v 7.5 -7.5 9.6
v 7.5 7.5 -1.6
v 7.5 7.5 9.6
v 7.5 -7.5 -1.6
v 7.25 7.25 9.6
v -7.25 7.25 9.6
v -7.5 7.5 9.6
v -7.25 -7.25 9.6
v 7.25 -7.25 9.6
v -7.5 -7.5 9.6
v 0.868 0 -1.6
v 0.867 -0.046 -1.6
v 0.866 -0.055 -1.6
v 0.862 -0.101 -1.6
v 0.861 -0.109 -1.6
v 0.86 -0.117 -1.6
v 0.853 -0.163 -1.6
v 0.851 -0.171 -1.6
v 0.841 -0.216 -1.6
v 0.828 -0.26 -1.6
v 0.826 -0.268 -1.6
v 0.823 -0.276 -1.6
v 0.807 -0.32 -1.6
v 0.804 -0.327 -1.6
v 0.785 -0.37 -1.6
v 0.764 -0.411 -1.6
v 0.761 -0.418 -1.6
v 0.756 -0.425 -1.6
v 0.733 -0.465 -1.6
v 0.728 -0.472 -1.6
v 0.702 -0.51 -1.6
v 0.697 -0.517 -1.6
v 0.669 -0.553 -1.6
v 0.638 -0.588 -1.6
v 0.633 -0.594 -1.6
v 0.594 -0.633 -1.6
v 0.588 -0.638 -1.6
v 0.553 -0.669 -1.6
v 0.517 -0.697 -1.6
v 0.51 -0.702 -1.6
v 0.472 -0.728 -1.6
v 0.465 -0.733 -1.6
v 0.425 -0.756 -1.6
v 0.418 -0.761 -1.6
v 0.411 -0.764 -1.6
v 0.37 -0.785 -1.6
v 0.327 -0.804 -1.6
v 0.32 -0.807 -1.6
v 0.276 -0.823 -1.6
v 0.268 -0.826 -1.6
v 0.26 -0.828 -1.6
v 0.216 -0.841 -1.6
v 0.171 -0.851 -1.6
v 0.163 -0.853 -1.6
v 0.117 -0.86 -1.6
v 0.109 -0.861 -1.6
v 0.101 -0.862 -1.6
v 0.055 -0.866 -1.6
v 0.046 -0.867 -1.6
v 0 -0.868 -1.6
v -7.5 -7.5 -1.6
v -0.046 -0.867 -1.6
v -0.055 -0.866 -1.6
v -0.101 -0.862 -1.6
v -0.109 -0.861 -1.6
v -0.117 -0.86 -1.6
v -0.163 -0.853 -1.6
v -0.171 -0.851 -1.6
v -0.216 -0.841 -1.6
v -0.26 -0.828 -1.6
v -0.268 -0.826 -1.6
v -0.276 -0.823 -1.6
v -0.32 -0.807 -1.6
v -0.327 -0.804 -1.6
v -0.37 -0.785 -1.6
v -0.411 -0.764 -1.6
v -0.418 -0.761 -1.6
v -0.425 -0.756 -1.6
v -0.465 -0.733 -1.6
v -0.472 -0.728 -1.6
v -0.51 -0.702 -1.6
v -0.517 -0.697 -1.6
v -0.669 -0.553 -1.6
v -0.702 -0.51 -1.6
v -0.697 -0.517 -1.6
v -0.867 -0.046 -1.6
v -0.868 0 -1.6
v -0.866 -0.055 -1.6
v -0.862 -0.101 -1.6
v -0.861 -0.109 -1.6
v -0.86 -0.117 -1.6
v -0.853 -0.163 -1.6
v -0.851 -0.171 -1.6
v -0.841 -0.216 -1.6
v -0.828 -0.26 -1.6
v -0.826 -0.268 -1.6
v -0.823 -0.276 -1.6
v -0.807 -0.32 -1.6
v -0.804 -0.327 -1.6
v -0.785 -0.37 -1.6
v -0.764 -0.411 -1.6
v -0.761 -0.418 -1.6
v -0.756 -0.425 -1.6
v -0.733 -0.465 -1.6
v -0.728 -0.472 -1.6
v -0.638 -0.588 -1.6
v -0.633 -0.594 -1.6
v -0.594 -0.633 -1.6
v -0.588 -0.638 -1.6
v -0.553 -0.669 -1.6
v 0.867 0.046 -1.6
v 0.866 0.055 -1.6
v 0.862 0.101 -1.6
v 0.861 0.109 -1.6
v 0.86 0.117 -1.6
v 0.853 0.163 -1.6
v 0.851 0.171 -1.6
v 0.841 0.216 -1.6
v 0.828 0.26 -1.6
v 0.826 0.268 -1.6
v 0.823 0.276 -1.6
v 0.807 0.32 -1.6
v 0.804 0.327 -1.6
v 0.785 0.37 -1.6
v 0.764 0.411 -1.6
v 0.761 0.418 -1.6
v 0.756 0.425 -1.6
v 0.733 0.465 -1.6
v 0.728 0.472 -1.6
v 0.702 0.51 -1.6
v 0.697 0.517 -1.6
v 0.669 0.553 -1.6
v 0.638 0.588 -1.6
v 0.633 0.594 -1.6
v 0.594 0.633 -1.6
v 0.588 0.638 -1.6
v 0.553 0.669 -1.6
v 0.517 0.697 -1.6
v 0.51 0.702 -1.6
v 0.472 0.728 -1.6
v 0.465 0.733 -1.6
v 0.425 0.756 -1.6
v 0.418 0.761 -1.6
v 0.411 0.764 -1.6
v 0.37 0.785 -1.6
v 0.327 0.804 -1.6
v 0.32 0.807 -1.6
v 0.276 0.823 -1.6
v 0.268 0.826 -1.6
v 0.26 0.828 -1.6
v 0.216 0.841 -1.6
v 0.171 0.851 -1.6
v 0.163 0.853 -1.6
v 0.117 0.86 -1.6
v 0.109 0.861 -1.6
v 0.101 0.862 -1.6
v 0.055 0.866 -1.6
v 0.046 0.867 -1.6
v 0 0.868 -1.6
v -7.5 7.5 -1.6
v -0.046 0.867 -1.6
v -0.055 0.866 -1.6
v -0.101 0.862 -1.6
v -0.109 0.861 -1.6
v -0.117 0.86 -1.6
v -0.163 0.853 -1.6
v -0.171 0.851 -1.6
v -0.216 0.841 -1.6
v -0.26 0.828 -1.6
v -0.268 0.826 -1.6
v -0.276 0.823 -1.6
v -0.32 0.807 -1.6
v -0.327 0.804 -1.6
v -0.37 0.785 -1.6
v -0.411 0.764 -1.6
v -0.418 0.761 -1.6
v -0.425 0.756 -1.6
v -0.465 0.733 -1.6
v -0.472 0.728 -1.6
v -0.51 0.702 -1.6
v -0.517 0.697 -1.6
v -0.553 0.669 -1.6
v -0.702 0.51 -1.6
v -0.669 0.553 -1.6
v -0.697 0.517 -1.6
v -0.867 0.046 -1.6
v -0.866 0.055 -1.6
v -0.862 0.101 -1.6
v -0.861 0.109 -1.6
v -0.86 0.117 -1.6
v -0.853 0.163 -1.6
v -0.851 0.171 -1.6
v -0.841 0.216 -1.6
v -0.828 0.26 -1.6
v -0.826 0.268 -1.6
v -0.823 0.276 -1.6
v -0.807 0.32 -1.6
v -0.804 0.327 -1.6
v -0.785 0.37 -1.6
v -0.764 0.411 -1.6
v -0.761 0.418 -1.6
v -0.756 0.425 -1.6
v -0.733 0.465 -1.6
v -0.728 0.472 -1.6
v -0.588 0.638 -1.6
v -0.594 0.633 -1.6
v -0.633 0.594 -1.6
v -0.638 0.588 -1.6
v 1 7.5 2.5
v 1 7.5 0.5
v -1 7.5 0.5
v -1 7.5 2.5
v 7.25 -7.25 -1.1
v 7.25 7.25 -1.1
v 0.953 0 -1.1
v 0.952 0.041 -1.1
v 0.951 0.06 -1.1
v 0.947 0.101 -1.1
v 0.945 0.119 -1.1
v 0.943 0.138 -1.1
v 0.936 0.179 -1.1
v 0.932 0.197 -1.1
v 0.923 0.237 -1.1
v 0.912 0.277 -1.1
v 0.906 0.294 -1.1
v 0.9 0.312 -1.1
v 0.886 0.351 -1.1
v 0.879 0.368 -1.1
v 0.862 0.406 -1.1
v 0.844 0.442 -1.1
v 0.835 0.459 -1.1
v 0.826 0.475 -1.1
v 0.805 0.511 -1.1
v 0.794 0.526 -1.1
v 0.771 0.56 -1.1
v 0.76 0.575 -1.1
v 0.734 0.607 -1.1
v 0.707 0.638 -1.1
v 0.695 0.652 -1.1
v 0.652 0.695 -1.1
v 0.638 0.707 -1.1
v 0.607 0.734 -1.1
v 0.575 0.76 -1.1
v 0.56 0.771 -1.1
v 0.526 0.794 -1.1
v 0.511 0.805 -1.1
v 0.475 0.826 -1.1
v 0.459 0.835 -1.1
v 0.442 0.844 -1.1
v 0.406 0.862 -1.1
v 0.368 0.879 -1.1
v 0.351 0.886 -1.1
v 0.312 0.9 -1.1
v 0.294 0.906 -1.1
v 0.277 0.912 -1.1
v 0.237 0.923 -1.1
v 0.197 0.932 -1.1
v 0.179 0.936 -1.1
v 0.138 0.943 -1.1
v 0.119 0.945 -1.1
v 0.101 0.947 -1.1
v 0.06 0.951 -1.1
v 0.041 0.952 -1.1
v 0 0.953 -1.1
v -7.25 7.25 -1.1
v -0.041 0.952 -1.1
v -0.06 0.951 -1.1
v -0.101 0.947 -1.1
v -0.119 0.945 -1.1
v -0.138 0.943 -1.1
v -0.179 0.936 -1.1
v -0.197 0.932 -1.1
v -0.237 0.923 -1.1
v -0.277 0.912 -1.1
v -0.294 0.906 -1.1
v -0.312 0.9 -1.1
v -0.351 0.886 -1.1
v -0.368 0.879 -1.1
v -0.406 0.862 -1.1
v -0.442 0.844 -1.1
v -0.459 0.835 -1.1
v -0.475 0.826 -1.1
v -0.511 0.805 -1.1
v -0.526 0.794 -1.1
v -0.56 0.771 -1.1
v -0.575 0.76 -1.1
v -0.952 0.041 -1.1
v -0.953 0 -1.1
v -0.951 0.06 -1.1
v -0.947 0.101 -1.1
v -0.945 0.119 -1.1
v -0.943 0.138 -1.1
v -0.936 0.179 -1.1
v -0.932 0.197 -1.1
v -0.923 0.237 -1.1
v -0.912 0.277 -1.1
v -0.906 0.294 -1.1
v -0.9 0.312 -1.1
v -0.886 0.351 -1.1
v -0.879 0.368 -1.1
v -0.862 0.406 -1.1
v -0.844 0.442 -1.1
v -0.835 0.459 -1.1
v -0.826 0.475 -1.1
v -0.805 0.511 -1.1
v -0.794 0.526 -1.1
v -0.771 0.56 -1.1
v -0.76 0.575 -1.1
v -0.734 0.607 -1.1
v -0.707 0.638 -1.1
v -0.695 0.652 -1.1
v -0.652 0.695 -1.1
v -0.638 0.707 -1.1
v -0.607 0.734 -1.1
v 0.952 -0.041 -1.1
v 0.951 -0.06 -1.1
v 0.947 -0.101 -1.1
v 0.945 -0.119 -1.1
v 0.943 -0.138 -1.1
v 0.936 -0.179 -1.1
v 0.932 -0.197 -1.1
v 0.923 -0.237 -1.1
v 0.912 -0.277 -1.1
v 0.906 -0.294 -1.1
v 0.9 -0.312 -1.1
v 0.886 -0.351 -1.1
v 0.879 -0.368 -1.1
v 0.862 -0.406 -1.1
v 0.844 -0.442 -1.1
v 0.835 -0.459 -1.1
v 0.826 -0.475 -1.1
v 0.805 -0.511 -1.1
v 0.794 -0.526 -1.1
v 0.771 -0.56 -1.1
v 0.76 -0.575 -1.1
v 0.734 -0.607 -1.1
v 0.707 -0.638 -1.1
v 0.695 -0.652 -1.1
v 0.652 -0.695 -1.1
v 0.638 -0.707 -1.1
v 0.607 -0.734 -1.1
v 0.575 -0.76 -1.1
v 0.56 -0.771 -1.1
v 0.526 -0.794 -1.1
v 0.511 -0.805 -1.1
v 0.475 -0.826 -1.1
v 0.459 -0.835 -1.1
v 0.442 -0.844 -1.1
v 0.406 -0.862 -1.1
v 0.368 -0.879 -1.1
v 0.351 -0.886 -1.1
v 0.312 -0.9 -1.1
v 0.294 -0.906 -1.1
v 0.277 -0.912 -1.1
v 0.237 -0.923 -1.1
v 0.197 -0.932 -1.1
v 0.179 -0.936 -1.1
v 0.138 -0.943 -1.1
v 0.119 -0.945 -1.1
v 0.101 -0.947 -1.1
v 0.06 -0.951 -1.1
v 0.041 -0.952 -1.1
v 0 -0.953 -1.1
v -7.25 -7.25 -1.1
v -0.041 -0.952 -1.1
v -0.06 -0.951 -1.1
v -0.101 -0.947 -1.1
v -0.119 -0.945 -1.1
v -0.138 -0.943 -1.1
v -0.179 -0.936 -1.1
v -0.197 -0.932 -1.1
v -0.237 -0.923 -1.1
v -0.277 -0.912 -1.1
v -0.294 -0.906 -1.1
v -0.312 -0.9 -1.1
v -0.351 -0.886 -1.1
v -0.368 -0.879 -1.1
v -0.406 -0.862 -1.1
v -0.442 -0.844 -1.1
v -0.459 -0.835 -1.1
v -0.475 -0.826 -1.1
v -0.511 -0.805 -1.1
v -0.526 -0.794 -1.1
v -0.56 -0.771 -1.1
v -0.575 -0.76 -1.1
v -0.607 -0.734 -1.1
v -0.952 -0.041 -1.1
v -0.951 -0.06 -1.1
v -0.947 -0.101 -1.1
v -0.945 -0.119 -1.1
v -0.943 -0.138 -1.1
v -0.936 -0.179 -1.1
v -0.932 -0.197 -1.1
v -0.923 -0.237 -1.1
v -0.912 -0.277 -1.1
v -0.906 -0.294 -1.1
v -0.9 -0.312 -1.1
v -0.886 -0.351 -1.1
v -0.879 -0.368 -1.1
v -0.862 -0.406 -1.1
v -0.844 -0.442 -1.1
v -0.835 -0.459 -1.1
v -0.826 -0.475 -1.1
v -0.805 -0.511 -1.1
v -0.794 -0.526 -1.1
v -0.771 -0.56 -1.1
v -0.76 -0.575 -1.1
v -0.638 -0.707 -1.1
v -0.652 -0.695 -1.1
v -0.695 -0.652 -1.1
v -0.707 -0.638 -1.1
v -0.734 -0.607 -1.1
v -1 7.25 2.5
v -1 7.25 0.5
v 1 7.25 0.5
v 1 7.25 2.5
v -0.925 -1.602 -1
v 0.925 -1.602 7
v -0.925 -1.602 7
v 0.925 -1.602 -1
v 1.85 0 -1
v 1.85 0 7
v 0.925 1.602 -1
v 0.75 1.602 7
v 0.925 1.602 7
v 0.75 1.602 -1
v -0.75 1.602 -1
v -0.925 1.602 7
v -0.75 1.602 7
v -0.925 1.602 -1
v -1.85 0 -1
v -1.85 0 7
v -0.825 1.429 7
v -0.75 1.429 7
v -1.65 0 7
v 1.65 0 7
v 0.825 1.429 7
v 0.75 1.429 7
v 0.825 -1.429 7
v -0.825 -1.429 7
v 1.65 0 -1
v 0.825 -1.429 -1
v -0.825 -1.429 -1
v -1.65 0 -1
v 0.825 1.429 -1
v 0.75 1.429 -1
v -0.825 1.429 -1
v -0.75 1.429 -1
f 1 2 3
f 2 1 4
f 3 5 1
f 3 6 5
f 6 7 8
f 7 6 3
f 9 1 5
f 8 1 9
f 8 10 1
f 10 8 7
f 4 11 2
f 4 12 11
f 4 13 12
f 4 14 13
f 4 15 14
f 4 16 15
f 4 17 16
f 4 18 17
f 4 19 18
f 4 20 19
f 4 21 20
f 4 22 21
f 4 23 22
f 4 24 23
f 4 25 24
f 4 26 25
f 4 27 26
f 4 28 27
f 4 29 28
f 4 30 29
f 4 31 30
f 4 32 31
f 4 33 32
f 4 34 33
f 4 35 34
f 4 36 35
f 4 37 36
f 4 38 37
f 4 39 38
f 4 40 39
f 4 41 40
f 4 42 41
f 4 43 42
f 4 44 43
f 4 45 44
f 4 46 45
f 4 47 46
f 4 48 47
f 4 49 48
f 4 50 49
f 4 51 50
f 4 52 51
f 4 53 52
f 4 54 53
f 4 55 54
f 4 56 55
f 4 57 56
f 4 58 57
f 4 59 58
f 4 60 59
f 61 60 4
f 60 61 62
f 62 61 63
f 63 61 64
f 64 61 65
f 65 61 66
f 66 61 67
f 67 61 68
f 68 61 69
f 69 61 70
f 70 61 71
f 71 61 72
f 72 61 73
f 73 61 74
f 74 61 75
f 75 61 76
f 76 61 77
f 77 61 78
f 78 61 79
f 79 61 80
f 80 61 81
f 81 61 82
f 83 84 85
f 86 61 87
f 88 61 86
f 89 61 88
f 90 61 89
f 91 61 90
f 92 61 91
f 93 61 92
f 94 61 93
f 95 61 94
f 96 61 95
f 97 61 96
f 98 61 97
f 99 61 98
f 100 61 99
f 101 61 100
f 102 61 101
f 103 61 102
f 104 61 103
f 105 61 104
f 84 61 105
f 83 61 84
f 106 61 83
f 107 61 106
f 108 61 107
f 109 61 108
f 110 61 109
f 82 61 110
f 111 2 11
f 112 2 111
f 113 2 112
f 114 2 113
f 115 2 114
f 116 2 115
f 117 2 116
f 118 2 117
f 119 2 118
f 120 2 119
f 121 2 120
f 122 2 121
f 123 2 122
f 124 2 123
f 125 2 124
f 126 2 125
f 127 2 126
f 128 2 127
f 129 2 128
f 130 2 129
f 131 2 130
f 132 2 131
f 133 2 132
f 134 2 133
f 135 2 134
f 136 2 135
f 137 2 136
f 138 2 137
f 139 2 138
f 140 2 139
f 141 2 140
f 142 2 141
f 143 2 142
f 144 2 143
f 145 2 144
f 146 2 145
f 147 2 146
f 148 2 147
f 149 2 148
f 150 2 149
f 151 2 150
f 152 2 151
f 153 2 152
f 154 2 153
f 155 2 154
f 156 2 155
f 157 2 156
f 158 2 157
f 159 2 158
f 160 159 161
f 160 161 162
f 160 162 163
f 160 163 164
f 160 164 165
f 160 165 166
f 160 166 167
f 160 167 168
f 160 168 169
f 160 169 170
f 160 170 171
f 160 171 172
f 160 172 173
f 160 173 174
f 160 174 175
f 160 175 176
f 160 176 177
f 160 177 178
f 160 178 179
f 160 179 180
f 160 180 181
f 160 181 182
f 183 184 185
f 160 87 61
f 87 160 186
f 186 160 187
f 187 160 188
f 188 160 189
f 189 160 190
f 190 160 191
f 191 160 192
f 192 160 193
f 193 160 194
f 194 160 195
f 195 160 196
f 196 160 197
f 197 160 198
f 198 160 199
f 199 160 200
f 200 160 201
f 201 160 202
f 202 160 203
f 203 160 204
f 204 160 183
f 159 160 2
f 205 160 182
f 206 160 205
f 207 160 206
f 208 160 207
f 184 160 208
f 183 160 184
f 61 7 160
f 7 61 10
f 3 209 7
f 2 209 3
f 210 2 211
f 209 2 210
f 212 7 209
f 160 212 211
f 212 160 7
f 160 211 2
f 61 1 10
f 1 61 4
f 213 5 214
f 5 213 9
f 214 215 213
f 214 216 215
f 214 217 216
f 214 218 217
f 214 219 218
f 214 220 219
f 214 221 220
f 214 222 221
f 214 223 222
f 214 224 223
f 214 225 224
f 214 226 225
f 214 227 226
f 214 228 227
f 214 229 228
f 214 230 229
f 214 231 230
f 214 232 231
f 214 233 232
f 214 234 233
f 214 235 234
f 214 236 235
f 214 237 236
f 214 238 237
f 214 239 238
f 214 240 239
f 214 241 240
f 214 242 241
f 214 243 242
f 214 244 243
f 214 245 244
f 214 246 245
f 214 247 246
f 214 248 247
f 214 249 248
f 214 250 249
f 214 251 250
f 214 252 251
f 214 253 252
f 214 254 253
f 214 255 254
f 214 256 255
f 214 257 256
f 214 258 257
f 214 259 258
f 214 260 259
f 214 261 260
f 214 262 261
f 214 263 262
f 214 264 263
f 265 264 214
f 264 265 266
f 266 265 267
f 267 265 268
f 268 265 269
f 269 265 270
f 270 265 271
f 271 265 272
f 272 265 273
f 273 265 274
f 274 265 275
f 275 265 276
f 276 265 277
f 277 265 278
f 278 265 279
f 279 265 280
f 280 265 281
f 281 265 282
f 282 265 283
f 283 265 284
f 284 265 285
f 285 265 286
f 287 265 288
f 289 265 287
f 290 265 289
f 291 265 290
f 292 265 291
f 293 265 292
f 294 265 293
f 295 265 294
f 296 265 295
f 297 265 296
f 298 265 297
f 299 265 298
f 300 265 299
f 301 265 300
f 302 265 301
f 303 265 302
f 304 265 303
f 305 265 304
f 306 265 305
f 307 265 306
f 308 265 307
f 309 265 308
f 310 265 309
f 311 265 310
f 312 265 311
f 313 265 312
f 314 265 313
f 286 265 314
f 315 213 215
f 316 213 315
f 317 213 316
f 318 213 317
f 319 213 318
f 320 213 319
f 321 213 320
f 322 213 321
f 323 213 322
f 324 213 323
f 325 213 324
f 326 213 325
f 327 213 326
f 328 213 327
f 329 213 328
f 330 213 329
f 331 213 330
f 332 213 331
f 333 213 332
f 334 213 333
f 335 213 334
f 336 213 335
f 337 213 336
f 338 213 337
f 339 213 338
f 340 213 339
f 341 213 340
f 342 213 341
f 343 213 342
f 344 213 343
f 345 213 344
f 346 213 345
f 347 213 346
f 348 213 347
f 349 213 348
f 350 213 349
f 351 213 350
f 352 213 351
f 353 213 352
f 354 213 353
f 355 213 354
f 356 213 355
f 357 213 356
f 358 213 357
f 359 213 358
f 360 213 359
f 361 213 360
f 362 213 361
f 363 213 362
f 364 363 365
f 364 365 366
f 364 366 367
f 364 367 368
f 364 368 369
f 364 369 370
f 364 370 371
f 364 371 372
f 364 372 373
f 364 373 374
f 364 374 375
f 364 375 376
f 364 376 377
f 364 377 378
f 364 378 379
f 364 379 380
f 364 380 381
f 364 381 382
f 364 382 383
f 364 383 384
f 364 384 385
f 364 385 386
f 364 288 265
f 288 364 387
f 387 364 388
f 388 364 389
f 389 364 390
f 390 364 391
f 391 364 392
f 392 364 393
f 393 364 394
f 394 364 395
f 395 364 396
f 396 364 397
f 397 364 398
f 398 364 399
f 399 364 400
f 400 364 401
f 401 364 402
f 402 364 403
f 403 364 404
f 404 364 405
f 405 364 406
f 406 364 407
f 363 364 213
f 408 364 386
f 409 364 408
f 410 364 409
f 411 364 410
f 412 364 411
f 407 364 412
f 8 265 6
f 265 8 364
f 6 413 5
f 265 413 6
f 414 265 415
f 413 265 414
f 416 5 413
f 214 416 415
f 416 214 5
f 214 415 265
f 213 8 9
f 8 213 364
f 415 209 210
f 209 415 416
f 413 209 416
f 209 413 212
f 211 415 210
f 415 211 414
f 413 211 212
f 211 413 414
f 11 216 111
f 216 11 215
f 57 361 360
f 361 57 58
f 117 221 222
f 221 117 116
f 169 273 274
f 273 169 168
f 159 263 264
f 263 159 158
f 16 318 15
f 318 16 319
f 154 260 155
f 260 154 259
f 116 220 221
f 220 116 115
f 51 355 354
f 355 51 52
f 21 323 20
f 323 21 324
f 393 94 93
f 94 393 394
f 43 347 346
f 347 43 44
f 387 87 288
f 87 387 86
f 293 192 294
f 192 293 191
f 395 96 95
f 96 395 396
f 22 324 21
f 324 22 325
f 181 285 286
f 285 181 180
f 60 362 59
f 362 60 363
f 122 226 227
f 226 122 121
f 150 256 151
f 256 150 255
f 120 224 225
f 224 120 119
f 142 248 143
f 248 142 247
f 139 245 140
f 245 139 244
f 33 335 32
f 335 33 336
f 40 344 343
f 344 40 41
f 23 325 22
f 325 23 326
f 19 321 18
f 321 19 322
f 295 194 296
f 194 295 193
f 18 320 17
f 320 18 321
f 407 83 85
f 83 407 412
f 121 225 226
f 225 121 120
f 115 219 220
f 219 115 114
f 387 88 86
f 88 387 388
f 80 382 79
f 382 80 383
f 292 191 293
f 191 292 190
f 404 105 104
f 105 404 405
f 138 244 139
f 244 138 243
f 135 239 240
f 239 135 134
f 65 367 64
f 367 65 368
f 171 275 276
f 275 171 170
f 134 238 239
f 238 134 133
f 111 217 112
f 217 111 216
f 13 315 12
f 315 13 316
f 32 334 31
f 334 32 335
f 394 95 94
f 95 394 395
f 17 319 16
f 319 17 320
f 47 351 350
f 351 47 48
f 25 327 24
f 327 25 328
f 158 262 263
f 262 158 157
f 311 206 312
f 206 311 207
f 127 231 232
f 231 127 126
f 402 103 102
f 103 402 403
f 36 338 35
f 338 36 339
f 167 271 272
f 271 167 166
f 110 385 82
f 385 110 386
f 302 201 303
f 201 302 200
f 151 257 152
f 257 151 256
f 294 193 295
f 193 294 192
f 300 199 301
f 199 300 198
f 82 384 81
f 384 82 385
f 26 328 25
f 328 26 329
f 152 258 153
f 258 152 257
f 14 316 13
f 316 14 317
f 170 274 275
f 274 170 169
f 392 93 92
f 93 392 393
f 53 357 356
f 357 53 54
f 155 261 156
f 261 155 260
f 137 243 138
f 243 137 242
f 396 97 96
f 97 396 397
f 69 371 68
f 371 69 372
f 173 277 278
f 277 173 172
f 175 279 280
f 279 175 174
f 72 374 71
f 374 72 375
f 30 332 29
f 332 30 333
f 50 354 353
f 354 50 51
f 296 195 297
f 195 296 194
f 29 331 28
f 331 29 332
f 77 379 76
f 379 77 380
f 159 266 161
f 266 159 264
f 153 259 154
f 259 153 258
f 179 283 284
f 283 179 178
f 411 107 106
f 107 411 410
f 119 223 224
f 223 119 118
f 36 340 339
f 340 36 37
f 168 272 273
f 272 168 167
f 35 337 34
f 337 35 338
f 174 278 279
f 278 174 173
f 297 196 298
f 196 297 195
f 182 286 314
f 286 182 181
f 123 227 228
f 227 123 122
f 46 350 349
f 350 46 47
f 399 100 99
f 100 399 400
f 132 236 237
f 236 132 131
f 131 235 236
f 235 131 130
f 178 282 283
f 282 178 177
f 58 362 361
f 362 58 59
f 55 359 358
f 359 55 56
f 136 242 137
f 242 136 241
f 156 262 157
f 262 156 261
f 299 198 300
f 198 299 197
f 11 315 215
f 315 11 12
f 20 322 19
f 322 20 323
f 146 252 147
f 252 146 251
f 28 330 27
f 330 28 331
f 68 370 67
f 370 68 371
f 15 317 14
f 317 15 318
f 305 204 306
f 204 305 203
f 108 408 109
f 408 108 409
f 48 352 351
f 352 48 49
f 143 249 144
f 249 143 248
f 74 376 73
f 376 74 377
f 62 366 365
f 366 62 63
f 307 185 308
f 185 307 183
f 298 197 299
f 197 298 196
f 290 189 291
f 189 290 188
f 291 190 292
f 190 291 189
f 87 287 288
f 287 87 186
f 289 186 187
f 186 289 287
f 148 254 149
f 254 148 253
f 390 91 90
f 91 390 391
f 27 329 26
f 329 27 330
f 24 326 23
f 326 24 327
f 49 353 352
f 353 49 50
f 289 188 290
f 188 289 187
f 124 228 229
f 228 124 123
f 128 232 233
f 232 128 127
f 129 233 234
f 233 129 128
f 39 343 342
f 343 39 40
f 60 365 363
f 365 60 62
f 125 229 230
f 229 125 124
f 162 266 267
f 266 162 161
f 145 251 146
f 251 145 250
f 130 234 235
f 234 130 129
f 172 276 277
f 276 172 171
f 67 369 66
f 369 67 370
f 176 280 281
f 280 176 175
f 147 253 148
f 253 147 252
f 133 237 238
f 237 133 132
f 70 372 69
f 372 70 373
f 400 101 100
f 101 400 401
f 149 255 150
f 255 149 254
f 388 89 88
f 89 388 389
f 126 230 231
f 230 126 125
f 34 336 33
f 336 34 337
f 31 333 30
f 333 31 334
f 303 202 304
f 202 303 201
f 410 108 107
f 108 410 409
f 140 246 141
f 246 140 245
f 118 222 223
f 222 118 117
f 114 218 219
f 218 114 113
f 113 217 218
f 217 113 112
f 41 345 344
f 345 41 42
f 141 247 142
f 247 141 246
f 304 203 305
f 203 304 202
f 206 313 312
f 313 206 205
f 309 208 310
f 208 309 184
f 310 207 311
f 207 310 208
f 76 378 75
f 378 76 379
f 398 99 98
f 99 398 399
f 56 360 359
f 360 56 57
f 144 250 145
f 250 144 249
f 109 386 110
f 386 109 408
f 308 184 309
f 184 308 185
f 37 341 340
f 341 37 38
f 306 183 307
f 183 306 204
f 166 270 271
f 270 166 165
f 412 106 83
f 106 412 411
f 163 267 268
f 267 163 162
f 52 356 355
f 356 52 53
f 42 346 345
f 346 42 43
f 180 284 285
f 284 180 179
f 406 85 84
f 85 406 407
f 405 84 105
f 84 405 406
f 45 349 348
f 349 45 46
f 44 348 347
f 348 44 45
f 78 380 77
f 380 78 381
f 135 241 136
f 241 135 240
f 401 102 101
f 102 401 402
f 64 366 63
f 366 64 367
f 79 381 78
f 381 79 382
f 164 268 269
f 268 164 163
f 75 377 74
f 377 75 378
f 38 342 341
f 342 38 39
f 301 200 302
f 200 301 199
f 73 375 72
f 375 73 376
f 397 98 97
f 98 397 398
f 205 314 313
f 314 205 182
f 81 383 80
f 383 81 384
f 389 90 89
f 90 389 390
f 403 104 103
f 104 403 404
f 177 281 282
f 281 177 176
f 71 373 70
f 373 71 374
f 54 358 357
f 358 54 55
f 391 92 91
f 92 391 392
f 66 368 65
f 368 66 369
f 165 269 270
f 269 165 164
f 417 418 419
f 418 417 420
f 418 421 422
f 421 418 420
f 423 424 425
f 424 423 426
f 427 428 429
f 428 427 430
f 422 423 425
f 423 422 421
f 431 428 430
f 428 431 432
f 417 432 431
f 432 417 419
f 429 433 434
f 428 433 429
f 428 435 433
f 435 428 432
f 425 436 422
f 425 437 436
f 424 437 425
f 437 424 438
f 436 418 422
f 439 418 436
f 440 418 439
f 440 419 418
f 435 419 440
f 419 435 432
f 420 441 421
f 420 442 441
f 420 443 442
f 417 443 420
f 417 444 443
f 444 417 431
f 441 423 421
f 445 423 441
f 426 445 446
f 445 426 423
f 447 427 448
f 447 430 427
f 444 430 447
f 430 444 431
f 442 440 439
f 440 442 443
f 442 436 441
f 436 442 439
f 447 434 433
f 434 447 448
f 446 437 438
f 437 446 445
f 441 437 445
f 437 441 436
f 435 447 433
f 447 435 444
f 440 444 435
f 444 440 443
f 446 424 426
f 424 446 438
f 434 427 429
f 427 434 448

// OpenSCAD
module motor_mount () {
    difference() {
        // The $fn = 100 makes it circular, getting rid of it will make it hexagonal
        translate([0, 0, -1]) {
            cylinder(8, 1.85, 1.85); 
        }
        cylinder(20, 1.65, 1.65, center = true);
        translate([-0.75, 0, -1]) {
            cube([1.5, 10, 20]);
        }   
    }
}


// This is the box
module hollow_enclosure () {
    translate([0,0,4]) {
        difference() {
            // This is the outer layer of the box, length and width of 15 cm
            cube([15, 15, 11.2], center = true);
            translate ([0,0,1]) {
                // This is the inner box that we subtract
                cube([14.5, 14.5, 12.2], center = true);
                }
            
        
           translate ([0,7,-2.5]) {
                        // This is the small cube we get rid of to make the hole for power
                        cube([2, 8, 2], center = true);
            }
       }
    }
}

difference() {
    difference(){
        hollow_enclosure();
        translate([0,0,0.5]) {
            cylinder(5, 0.8, 1.65, center = true, $fn = 100);
            }
        }
    translate([0,0,6]) {
        cylinder(5, 1.4, 1.65, center = true, $fn = 100 );
    }
    }
motor_mount();
